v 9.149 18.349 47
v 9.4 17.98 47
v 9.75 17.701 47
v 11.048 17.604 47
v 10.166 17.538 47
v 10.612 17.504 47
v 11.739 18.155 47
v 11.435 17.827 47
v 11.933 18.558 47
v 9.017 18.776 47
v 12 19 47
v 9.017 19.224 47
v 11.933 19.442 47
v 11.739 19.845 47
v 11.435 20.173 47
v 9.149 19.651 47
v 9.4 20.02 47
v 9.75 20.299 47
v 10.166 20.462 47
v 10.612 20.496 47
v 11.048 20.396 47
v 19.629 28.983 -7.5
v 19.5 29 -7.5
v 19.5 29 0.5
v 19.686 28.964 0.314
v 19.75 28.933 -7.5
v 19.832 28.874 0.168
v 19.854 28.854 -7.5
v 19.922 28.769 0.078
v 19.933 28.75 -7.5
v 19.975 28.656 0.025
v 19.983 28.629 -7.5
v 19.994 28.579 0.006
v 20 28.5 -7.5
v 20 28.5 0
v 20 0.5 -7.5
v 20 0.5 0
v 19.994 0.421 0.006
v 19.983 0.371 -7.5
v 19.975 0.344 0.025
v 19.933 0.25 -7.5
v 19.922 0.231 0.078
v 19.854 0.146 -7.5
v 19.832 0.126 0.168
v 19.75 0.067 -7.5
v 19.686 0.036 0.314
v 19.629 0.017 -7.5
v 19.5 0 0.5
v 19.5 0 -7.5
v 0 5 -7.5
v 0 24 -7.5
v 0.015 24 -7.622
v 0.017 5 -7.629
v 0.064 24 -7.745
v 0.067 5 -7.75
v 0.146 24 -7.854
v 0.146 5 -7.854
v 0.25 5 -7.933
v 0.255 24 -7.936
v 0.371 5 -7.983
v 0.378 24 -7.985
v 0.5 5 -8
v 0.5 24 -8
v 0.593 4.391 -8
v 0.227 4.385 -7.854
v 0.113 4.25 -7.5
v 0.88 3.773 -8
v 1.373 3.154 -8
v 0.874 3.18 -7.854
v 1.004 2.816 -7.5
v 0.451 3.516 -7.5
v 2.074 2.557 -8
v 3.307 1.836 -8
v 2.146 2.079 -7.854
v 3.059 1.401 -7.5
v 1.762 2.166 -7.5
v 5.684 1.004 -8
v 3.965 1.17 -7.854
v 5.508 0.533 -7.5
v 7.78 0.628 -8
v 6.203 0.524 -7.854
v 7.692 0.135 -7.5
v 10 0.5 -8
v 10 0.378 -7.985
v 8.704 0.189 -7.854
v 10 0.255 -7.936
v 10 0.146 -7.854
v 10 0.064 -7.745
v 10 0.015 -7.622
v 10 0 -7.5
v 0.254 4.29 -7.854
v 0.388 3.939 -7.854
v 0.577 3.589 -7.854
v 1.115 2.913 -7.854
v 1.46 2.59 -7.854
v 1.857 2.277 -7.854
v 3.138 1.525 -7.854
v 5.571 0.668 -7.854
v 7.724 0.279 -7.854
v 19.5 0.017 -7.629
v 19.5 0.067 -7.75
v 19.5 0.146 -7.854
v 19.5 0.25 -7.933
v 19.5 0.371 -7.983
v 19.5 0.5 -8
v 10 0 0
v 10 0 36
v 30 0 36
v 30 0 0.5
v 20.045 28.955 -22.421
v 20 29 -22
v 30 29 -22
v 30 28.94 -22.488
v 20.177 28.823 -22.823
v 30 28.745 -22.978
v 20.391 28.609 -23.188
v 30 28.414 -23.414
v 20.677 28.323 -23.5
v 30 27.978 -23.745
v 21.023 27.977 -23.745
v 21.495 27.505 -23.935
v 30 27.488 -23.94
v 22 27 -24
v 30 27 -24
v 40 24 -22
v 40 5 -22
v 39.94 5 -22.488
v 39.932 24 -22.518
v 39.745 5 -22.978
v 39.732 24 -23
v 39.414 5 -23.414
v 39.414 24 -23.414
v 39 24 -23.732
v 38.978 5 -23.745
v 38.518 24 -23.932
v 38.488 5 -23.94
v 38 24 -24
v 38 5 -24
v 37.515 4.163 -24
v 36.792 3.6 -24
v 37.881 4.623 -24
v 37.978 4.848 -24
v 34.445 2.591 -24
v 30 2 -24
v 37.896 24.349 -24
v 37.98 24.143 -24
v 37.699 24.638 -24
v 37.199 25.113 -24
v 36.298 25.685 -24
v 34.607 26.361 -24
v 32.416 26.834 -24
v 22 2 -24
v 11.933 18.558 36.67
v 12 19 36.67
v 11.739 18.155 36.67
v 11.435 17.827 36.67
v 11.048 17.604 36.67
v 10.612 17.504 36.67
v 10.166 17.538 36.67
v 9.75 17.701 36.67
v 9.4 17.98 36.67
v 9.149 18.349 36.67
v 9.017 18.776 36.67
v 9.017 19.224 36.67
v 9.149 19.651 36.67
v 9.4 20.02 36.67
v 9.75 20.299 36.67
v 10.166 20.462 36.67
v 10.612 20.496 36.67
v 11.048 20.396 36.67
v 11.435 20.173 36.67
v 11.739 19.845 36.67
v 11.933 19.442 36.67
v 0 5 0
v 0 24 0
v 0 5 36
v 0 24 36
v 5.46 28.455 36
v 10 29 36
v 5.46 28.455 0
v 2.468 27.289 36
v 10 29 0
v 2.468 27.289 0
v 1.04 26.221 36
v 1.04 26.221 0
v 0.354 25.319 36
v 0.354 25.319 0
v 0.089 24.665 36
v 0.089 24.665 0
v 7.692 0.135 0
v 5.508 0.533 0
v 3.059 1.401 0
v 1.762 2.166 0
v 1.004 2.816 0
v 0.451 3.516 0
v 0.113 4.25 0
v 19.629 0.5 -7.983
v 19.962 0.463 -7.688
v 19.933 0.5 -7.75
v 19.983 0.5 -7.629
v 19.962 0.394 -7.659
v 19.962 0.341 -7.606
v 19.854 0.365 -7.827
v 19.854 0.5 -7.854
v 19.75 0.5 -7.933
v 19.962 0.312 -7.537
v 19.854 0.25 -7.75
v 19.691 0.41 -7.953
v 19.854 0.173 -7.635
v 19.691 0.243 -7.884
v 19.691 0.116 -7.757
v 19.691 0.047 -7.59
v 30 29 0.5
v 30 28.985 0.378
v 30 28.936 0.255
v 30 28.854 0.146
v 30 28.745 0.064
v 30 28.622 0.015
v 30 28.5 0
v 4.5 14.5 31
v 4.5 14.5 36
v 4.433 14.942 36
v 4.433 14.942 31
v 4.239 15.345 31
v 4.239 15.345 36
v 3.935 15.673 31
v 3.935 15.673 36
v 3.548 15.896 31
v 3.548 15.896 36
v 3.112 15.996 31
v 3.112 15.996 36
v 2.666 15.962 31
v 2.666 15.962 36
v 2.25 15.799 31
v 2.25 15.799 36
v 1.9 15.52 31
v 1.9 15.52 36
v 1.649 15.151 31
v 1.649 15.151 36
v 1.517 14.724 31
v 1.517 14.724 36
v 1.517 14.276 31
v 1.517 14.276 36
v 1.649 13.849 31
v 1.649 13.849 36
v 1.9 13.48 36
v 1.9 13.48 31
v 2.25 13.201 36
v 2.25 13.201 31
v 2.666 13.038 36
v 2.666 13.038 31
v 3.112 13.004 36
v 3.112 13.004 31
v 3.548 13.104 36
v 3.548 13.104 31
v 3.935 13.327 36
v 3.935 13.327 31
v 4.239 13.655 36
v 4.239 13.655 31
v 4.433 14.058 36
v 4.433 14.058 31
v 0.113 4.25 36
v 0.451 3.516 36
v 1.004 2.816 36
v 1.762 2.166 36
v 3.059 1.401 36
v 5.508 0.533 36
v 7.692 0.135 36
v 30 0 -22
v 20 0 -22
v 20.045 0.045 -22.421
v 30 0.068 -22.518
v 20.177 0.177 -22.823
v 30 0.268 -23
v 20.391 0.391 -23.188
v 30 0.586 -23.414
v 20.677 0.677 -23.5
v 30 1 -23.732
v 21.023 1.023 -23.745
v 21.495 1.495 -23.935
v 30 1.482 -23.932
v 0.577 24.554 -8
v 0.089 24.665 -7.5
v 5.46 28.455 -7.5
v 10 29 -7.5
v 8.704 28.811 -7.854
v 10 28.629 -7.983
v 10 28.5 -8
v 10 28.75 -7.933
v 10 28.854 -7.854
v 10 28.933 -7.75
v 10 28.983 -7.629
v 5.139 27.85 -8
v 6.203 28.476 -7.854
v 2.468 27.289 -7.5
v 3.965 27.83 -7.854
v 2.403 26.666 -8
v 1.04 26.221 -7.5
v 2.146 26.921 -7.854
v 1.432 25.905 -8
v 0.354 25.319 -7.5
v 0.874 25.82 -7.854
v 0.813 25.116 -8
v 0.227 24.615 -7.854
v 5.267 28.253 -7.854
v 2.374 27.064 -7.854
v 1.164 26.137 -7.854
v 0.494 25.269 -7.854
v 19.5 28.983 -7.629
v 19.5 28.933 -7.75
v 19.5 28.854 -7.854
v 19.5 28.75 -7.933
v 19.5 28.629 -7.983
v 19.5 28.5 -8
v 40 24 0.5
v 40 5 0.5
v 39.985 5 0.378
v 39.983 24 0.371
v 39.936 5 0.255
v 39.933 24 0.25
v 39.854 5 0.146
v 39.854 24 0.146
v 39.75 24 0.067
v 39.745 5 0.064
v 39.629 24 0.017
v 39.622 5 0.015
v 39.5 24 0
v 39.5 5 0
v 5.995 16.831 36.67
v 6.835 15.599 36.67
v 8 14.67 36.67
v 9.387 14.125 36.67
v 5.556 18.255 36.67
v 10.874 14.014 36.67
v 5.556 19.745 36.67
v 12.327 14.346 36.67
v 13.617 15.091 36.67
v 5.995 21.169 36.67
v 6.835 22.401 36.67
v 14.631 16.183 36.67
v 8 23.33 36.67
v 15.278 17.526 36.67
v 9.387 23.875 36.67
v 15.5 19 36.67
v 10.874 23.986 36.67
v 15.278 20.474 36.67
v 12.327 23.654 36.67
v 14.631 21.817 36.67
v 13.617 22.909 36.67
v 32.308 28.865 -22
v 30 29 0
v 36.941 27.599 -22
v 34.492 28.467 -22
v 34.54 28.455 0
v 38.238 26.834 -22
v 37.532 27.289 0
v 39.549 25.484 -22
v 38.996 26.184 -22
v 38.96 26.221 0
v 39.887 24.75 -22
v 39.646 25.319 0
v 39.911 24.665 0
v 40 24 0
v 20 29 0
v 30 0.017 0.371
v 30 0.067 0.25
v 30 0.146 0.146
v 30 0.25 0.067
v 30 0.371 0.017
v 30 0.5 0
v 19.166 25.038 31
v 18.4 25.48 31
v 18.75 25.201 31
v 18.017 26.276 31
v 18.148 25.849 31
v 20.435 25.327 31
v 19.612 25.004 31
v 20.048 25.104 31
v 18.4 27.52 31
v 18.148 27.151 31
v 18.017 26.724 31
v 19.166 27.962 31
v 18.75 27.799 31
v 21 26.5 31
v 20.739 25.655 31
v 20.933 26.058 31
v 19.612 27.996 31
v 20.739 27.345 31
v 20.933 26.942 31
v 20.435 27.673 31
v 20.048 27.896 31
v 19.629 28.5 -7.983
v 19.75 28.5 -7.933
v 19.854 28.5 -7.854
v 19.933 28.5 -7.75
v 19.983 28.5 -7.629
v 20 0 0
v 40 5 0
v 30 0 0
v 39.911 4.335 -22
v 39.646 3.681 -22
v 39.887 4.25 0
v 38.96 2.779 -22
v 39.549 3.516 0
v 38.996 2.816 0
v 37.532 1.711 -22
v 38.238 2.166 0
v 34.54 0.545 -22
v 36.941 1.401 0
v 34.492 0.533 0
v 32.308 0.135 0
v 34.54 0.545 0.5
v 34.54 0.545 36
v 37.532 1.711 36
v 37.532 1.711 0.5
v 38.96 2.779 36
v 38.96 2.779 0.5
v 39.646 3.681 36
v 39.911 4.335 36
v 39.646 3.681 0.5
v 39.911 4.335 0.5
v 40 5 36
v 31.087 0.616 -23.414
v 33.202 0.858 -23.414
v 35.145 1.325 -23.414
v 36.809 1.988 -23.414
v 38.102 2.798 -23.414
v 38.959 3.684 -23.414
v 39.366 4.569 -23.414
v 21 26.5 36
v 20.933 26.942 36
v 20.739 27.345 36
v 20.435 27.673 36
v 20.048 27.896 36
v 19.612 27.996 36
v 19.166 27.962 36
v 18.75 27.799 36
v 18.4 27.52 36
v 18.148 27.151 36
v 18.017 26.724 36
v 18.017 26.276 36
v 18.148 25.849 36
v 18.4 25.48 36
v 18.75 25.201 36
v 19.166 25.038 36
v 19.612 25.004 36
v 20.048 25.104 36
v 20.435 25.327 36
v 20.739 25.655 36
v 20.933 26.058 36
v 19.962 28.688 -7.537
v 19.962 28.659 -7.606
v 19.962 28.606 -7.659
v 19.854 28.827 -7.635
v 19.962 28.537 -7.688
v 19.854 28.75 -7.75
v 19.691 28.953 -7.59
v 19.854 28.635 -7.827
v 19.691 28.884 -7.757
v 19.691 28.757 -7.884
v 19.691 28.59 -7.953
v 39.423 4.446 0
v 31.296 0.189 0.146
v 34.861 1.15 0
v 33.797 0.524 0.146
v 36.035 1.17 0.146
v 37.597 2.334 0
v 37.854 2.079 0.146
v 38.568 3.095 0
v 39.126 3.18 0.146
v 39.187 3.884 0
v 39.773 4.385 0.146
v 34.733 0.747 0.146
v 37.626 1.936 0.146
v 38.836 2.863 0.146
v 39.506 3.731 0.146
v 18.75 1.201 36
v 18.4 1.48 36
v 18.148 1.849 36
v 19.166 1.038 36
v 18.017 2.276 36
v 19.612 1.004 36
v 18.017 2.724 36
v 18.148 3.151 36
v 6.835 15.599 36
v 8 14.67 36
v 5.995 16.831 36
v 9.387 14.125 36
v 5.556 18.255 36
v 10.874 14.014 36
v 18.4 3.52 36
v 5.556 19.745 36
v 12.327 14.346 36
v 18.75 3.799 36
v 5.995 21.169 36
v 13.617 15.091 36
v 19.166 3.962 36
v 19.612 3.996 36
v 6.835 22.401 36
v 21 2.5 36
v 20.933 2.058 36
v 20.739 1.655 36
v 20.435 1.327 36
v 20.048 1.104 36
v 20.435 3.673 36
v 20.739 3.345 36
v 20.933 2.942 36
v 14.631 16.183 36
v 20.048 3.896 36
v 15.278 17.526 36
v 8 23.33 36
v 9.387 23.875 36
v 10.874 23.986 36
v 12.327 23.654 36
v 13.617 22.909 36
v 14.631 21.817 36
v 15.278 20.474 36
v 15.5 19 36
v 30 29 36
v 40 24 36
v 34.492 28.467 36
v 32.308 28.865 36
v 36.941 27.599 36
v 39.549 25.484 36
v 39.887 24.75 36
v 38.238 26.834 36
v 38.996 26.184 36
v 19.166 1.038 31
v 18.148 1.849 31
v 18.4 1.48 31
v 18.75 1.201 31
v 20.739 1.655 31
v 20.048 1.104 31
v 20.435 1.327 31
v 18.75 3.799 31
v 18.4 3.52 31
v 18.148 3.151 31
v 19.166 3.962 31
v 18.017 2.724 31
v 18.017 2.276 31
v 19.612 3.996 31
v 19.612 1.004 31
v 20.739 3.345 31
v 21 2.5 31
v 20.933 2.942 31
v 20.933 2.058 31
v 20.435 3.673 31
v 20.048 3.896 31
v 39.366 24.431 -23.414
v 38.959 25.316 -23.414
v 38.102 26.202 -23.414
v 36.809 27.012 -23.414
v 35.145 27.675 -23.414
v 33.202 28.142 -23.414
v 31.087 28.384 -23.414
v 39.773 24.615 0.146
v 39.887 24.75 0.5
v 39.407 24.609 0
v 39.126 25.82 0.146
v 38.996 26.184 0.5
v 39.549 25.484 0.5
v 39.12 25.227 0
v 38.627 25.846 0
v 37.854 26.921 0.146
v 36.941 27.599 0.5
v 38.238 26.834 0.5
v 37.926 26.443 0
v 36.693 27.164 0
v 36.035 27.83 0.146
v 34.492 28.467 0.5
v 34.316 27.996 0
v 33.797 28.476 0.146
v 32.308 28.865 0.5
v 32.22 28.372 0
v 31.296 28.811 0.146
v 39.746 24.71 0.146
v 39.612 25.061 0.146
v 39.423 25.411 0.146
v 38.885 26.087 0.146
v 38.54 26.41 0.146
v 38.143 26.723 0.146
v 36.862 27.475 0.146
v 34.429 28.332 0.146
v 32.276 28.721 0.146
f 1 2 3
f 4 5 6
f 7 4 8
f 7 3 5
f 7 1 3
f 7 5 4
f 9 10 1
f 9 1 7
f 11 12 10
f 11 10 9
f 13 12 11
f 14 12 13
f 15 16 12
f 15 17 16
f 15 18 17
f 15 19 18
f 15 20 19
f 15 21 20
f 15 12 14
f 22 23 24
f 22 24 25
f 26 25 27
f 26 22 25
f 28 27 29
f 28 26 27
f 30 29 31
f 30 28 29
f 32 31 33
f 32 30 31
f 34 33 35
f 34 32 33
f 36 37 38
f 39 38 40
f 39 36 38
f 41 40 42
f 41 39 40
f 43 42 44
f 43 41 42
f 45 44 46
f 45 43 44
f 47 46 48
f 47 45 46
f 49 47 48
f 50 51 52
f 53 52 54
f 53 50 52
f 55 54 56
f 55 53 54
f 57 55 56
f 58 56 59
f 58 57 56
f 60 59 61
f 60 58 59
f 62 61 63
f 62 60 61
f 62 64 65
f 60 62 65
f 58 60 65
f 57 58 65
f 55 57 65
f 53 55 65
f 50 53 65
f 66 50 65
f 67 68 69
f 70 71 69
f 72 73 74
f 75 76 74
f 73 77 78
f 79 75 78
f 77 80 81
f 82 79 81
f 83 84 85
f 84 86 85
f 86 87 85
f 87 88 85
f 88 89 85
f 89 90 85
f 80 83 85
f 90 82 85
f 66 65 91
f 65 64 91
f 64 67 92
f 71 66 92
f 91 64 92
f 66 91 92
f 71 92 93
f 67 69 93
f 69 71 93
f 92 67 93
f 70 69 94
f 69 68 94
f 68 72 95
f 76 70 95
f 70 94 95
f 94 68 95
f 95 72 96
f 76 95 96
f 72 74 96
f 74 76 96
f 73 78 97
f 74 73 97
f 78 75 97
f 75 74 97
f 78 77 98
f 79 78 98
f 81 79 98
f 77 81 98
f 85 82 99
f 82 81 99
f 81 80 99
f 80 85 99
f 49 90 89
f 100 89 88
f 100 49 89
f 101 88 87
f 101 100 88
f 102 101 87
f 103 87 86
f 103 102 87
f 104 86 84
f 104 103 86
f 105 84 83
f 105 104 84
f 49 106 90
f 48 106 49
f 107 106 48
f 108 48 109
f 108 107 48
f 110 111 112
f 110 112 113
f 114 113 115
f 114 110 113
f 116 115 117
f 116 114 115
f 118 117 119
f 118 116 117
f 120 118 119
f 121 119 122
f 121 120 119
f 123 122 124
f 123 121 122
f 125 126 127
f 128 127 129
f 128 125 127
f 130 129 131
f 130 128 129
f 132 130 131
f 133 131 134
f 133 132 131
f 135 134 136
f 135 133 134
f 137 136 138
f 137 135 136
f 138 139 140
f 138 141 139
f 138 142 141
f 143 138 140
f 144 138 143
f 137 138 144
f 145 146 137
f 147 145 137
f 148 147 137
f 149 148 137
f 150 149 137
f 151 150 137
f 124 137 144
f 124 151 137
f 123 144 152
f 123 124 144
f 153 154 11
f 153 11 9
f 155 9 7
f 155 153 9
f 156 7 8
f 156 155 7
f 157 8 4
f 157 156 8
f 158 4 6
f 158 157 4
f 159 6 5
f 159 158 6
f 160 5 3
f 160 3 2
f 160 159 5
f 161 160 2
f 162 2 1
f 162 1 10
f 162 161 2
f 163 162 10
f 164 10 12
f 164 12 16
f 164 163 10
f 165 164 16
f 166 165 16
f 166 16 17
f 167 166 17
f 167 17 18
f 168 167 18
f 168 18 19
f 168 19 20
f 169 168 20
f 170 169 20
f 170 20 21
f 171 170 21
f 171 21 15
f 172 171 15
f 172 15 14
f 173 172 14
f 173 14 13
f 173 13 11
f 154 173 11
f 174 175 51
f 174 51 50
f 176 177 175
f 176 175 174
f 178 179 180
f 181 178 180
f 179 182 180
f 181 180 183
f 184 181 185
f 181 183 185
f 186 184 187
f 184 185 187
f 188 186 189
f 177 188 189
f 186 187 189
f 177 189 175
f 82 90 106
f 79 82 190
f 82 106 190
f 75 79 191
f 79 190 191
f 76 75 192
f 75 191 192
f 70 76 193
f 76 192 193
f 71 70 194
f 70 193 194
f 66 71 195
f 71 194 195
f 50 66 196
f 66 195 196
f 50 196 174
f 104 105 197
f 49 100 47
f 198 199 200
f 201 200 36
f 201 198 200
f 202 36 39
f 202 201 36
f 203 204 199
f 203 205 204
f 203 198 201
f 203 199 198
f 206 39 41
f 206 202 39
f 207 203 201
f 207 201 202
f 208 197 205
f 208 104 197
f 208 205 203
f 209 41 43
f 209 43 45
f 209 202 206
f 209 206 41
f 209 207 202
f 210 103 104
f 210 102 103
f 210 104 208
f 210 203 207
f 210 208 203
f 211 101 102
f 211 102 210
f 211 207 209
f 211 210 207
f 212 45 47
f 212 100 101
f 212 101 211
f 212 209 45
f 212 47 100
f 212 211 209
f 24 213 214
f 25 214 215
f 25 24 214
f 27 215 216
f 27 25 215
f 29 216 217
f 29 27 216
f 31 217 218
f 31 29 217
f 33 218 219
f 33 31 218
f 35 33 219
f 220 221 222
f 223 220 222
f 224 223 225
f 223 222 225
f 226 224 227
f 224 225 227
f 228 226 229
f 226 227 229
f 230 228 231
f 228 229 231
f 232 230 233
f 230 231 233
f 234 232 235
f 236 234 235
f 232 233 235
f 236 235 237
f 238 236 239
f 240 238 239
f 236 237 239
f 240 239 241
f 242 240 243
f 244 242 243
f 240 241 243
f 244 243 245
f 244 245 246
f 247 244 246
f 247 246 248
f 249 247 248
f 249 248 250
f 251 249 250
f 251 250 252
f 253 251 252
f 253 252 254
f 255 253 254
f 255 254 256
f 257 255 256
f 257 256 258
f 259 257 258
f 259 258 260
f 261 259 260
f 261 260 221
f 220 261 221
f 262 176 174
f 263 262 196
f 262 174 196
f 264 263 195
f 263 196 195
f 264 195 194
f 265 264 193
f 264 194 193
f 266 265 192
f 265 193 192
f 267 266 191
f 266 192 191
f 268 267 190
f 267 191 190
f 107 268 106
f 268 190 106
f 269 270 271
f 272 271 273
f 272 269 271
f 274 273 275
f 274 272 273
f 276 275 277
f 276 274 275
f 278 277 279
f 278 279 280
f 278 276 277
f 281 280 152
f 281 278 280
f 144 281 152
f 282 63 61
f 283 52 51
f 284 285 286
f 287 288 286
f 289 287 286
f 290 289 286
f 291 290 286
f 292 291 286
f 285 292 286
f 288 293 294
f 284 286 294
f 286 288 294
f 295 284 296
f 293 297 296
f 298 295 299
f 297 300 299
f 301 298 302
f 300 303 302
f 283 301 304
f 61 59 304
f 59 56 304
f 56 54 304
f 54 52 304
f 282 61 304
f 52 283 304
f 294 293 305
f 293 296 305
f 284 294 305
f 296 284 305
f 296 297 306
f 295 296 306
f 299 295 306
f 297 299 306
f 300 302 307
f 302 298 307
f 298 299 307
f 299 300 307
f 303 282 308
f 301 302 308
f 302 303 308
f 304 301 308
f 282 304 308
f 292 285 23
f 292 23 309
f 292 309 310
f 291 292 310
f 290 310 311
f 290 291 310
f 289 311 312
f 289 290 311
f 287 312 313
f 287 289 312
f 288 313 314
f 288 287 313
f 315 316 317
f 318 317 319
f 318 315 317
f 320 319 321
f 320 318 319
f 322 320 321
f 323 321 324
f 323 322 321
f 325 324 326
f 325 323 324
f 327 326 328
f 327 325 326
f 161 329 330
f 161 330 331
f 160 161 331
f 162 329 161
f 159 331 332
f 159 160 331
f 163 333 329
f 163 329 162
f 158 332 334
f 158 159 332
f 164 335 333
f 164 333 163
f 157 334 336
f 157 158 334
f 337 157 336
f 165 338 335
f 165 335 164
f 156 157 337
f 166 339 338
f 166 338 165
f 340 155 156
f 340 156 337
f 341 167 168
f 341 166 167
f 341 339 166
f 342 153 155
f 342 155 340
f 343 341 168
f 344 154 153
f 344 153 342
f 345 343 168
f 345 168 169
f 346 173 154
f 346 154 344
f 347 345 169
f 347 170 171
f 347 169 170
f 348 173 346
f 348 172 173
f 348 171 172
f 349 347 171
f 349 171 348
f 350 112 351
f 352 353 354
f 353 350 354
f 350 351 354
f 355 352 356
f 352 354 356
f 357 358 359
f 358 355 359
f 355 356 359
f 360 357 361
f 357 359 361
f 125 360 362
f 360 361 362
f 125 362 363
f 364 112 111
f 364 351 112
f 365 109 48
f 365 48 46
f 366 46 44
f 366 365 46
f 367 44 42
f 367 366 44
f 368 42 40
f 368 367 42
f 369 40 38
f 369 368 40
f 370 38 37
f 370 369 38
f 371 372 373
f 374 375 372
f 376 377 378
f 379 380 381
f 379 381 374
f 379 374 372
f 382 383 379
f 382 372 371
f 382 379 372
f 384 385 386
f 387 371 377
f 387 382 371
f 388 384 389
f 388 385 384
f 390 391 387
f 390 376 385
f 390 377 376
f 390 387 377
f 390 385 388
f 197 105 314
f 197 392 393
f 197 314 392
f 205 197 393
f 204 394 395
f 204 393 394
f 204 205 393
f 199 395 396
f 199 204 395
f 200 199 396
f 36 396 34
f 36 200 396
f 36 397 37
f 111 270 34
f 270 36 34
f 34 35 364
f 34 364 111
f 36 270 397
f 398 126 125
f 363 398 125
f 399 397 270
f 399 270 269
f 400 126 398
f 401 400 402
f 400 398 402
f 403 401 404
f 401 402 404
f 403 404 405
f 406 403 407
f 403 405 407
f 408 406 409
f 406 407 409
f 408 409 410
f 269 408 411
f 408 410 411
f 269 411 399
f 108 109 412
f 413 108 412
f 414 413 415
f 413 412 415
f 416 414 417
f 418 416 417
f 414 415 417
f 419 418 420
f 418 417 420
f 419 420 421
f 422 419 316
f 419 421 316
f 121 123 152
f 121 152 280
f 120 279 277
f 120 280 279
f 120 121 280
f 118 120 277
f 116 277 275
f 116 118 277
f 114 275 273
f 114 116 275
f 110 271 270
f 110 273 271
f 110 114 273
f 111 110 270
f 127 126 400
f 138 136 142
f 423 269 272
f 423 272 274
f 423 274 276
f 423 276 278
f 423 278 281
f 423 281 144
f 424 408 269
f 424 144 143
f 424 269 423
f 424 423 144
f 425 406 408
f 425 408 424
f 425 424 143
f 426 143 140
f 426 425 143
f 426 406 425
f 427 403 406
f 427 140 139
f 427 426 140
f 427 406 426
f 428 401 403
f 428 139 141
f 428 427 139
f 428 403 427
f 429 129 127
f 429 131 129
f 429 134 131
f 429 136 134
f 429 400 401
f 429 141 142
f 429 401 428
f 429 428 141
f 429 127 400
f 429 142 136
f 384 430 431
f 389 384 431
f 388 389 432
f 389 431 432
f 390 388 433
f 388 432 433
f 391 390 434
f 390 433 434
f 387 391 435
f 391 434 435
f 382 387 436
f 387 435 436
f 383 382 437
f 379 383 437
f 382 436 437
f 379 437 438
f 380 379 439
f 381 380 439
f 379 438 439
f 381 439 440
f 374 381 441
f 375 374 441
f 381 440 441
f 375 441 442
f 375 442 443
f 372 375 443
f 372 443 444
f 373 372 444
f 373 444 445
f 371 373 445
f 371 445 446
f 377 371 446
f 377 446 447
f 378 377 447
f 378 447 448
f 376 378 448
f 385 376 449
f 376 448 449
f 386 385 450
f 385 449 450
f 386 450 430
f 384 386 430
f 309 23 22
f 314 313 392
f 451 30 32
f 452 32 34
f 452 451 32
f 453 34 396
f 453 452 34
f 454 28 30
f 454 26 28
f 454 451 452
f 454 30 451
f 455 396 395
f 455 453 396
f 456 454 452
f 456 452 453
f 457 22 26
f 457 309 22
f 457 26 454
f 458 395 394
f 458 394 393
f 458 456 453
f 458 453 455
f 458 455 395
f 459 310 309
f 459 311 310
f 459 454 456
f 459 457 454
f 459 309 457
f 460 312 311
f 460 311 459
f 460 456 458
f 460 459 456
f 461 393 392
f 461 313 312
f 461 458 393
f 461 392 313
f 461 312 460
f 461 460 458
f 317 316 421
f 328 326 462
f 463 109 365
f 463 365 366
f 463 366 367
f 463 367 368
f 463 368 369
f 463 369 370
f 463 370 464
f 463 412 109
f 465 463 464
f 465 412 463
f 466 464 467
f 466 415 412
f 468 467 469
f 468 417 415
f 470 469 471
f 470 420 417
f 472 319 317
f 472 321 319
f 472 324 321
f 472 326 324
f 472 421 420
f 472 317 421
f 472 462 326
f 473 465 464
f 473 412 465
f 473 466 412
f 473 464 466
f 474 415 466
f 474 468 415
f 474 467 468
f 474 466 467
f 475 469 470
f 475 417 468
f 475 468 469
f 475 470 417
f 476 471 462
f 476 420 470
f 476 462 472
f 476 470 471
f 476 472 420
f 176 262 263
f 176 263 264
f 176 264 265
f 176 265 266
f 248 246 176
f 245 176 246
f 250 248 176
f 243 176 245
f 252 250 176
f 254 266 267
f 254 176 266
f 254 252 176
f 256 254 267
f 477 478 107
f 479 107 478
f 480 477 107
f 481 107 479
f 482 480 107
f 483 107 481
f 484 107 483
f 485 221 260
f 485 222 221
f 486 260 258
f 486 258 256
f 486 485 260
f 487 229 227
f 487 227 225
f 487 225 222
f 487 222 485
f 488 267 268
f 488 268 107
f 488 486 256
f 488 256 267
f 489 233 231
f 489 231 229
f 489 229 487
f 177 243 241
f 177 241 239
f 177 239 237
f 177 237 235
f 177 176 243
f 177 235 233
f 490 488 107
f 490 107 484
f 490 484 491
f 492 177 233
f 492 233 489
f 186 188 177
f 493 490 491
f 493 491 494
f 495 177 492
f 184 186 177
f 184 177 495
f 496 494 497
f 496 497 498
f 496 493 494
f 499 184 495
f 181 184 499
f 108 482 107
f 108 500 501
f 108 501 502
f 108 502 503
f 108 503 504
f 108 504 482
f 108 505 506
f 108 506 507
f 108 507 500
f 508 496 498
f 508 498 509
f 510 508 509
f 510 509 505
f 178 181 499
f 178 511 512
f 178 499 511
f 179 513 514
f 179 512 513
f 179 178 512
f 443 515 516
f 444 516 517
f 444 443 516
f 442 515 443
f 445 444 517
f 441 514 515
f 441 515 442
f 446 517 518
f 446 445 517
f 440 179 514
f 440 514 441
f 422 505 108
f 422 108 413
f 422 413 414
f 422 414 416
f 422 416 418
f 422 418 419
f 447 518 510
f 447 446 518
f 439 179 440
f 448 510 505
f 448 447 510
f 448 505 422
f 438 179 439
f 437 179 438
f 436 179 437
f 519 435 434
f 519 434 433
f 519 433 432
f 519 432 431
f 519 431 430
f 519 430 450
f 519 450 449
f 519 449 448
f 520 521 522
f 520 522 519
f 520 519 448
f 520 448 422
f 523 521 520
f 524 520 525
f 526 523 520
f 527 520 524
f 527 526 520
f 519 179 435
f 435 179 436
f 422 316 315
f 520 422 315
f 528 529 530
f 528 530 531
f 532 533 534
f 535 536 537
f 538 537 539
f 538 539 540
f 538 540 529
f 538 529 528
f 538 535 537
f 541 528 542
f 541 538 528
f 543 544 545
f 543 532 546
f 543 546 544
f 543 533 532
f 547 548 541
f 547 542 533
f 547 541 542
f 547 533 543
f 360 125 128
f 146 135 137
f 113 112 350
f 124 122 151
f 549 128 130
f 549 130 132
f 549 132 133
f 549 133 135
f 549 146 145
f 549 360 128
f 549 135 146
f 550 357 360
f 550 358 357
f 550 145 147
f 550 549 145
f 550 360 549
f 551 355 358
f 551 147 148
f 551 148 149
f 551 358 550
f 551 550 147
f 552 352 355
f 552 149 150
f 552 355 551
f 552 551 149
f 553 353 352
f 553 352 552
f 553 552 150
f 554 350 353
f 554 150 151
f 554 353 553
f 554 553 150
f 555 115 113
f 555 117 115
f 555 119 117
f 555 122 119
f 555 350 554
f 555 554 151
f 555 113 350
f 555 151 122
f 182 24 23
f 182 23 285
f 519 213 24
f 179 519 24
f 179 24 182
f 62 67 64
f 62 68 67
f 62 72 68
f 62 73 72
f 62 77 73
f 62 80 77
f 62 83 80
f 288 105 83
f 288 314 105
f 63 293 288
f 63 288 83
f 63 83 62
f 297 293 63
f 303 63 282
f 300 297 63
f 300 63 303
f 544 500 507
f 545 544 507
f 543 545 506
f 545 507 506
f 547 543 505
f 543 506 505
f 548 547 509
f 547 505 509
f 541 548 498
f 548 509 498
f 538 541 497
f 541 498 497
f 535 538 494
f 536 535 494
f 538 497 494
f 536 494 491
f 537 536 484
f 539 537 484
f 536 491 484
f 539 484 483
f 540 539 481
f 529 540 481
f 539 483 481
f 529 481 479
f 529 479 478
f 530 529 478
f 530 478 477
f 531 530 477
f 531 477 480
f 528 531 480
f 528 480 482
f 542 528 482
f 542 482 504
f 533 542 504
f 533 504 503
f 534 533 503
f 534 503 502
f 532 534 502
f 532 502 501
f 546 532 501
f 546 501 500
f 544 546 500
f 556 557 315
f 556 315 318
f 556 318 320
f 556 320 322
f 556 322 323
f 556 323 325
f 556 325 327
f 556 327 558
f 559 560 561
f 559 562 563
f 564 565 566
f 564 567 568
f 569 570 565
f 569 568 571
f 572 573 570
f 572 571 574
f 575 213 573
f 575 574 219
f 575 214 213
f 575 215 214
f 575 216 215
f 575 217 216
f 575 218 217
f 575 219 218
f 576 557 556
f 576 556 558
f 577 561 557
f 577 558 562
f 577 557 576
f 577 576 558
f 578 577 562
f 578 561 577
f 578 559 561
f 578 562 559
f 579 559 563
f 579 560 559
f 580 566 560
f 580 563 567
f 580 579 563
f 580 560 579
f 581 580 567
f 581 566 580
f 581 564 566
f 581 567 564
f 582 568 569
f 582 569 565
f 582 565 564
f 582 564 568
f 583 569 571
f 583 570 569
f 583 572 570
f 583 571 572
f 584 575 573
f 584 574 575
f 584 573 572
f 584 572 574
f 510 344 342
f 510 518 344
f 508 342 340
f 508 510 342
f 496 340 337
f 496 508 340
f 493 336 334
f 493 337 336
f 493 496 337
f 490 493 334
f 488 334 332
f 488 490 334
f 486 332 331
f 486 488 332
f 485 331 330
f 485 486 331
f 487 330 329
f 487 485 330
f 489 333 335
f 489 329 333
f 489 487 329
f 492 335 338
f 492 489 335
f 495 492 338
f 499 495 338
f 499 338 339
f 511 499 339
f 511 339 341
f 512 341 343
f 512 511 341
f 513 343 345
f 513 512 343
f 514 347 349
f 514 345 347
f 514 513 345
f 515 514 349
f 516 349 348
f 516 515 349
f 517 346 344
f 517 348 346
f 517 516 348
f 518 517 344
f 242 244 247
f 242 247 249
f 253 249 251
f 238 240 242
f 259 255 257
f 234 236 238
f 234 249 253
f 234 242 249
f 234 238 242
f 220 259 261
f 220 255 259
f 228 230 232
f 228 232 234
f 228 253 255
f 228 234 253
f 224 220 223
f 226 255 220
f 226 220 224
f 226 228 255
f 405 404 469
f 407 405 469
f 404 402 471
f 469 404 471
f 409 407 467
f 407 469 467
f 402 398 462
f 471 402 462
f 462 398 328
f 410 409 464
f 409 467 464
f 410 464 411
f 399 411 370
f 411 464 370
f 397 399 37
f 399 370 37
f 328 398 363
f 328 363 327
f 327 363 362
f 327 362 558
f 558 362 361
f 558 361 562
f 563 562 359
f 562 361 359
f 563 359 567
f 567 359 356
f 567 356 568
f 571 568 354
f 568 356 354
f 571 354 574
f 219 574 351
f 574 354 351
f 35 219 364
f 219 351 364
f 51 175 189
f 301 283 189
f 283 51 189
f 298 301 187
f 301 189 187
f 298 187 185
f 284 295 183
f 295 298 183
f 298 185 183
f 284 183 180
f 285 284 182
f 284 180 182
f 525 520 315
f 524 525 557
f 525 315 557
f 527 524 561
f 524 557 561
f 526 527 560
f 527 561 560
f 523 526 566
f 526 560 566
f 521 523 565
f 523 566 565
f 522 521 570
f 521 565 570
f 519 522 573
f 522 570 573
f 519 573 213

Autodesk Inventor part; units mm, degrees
ref_plane "YZ Plane" through (0, 0, 0) normal (1, 0, 0) x (0, 1, 0)
ref_plane "XZ Plane" through (0, 0, 0) normal (0, 1, 0) x (-1, 0, 0)
ref_plane "XY Plane" through (0, 0, 0) normal (0, 0, 1) x (1, 0, 0)
sketch "Sketch1" plane through (0, 0, 0) normal (0, 0, 1) x (1, 0, 0)
  ellipse E0 centre (10, 24) end of major axis (0, 24) minor radius 5 (10, 29) -> (0, 24) ccw
  ellipse E1 centre (30, 24) end of major axis (40, 24) minor radius 5 (40, 24) -> (30, 29) ccw
  ellipse E2 centre (30, 5) end of major axis (40, 5) minor radius 5 (30, 0) -> (40, 5) ccw
  ellipse E3 centre (10, 5) end of major axis (0, 5) minor radius 5 (0, 5) -> (10, 0) ccw
  line L0 (30, 29) -> (10, 29)
  line L1 (0, 24) -> (0, 5)
  line L2 (10, 0) -> (30, 0)
  line L3 (40, 5) -> (40, 24)
  point P0 (0, 0)
extrude "Extrusion2" add sketch "Sketch1" along normal blind 36
sketch "Sketch2" plane through (0, 0, 36) normal (0, 0, 1) x (1, 0, 0)
  line L0 (0, 24) -> (0, 5) projected
  line L1 (10, 0) -> (30, 0) projected
  line L2 (30, 29) -> (10, 29) projected
  line L3 (14.358, 14.5) -> (-3.5199, 14.5)
  circle A0 centre (3, 14.5) radius 1.5
  line L4 (21.3512, 2.5) -> (5.4191, 2.5)
  line L5 (21.3512, 26.5) -> (5.4191, 26.5)
  line L6 (19.5, 31.1643) -> (19.5, -4.236)
  circle A1 centre (19.5, 26.5) radius 1.5001
  circle A2 centre (19.5, 2.5) radius 1.5001
  point P0 (0, 0)
  dimension "d16" = 29
  dimension "d17" = 14.5
  dimension "d18" = 3
  dimension "d19" = 3
  dimension "d20" = 24
  dimension "d21" = 12
  dimension "d22" = 16.5
extrude "Extrusion3" cut sketch "Sketch2" against normal blind 5
thread "Thread1" size "M3x0.5" class "6H" standard "ANSI Metric M Profile" full length
thread "Thread2" size "M3x0.5" class "6H" standard "ANSI Metric M Profile" full length
thread "Thread3" size "M3x0.5" class "6H" standard "ANSI Metric M Profile" full length
sketch "Sketch3" plane through (0, 0, 36) normal (0, 0, 1) x (1, 0, 0)
  line L0 (0, 24) -> (0, 5) projected
  line L1 (30, 29) -> (10, 29) projected
  line L2 (-1.3483, 17.5) -> (17.9999, 17.5)
  line L3 (12, 35.2177) -> (12, 13)
  circle A0 centre (10.5, 19) radius 1.5
  point P0 (0, 0)
  dimension "d31" = 11.5
  dimension "d32" = 12
  dimension "d33" = 3
  dimension "d34" = 1.5
  dimension "d35" = 1.5
extrude "Extrusion4" add sketch "Sketch3" along normal blind 11 contours A0
sketch "Sketch4" plane through (0, 0, 36) normal (0, 0, 1) x (1, 0, 0)
  circle A0 centre (10.5, 19) radius 1.5 projected
  circle A1 centre (10.5, 19) radius 5
  point P0 (0, 0)
  dimension "d40" = 10
extrude "Extrusion5" add sketch "Sketch4" along normal blind 0.67
sketch "Sketch5" plane through (0, 0, 0) normal (0, 0, -1) x (-1, 0, 0)
  ellipse E0 centre (-10, 24) end of major axis (0, 24) minor radius 5 (0, 24) -> (-10, 29) ccw projected
  line L0 (-30, 29) -> (-10, 29) projected
  line L1 (-40, 5) -> (-40, 24) projected
  line L2 (-10, 0) -> (-30, 0) projected
  ellipse E1 centre (-10, 5) end of major axis (0, 5) minor radius 5 (-10, 0) -> (0, 5) ccw projected
  line L3 (0, 24) -> (0, 5) projected
  line L4 (-20, 29) -> (-20, 0)
  point P0 (0, 0)
  dimension "d42" = 40
  dimension "d43" = 20
extrude "Extrusion6" add sketch "Sketch5" along normal blind 8
sketch "Sketch6" plane through (0, 0, 0) normal (0, 0, -1) x (-1, 0, 0)
  line L0 (-20, 0) -> (-20, 29) projected
  line L1 (-30, 29) -> (-20, 29) projected
  ellipse E0 centre (-30, 24) end of major axis (-40, 24) minor radius 5 (-30, 29) -> (-40, 24) ccw projected
  line L2 (-40, 5) -> (-40, 24) projected
  ellipse E1 centre (-30, 5) end of major axis (-40, 5) minor radius 5 (-40, 5) -> (-30, 0) ccw projected
  line L3 (-20, 0) -> (-30, 0) projected
  point P0 (0, 0)
fillet "Fillet2" radius 0.5 13 edges at (15, 29, -8) (0, 14.5, -8) (2.9289, 1.4645, -8) (15, 0, -8) (2.9289, 27.5355, -8) (20, 29, -4) (37.0711, 27.5355, 0) (40, 14.5, 0) (37.0711, 1.4645, 0) (25, 0, 0) (25, 29, 0) (20, 14.5, -8) (20, 0, -4)
extrude "Extrusion8" add sketch "Sketch6" along normal blind 24
fillet "Fillet3" radius 2 6 edges at (25, 0, -24) (40, 14.5, -24) (37.0711, 27.5355, -24) (25, 29, -24) (37.0711, 1.4645, -24) (20, 14.5, -24)
properties part number "12V geared motor"
